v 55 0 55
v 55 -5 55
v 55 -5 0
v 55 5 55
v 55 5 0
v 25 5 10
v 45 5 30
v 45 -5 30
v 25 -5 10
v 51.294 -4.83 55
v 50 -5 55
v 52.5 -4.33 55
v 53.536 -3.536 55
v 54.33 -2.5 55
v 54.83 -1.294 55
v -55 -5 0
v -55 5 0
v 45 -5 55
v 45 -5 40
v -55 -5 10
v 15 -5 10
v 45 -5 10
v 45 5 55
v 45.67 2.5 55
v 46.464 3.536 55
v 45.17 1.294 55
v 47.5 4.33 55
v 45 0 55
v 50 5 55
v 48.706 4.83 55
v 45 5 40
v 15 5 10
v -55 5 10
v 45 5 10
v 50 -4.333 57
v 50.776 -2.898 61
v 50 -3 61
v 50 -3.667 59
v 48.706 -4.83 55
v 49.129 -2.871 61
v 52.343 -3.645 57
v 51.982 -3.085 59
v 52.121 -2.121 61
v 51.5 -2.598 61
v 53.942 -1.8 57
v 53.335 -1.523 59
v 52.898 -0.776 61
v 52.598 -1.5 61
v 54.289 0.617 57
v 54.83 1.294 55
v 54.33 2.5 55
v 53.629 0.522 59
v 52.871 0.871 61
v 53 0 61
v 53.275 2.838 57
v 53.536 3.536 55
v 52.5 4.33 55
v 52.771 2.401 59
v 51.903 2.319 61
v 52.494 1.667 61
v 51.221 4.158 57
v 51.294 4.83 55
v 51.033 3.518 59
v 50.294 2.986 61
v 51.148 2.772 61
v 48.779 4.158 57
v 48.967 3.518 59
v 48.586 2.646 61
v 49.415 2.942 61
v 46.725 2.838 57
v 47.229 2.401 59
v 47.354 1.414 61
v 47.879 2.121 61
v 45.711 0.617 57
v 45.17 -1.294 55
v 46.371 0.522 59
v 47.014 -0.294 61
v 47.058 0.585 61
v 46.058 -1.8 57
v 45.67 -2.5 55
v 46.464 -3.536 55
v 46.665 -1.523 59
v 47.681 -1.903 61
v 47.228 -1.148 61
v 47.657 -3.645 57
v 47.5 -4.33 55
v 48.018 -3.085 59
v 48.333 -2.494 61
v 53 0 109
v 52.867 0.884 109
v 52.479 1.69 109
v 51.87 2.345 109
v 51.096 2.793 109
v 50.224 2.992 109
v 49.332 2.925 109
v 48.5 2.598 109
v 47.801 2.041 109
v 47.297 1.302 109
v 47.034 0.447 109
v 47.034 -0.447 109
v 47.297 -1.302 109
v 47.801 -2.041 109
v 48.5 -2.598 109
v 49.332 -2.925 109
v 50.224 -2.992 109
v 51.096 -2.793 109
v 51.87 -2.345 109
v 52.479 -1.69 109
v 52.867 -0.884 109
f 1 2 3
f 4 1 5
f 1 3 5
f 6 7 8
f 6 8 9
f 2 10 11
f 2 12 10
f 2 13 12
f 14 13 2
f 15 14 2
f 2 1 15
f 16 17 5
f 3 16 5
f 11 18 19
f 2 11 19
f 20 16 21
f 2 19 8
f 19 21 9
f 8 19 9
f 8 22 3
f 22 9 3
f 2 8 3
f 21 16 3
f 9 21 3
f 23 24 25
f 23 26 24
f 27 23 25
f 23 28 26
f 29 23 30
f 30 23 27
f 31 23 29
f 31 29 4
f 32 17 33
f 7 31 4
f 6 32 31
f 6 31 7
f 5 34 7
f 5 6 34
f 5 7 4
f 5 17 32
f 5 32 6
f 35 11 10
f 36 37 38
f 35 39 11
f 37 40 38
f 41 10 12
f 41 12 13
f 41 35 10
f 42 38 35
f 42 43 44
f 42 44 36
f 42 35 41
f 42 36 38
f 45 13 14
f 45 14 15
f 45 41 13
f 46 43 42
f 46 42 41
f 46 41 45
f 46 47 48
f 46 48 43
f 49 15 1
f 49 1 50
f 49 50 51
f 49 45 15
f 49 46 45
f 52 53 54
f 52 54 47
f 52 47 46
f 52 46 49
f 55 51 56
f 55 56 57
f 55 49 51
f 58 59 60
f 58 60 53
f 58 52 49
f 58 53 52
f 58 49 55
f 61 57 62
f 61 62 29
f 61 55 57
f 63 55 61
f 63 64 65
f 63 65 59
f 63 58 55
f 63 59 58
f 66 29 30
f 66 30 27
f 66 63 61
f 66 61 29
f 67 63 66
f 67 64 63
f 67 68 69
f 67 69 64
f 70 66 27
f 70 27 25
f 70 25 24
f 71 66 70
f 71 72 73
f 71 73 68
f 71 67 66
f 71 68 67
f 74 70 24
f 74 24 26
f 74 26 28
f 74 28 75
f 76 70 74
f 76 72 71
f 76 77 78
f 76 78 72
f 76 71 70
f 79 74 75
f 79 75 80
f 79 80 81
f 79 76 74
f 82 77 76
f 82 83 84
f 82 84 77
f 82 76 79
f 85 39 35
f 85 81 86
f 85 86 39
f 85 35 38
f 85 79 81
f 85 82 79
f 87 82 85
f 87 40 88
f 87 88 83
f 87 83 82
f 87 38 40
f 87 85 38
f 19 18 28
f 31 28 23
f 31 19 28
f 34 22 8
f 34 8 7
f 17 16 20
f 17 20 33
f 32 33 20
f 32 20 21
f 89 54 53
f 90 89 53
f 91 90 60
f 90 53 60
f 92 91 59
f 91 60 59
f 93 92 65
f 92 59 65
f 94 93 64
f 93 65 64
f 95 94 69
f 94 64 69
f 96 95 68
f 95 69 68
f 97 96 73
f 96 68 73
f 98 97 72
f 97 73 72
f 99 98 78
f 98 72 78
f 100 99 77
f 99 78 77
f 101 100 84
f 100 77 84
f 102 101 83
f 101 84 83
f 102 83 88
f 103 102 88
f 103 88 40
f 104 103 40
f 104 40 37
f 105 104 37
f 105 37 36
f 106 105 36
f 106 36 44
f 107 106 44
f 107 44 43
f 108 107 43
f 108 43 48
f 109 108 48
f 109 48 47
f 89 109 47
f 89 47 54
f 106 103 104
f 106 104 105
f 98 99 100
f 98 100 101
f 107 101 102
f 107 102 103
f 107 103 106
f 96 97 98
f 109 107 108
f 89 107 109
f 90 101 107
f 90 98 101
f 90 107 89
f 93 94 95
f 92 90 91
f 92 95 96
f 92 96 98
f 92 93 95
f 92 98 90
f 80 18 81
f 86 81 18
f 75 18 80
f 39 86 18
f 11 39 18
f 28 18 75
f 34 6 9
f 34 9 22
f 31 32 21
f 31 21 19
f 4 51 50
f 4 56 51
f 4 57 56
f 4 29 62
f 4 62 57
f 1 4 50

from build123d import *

# Parameters (mm, degrees)
F0_W      = 110
F0_H      = 10
F1_DEPTH  = 10
F2_W      = 10
F2_H      = 10
F3_DEPTH  = 45
F4_R      = 3
F5_DEPTH  = 54
F12_DEPTH = 10


with BuildPart() as f1:
    # F0 (on Top) → F1 (new body)
    with BuildSketch(Plane.XY):
        Rectangle(F0_W, F0_H)
    extrude(amount=F1_DEPTH)

    # F2 (on face) → F3 (join)
    with BuildSketch(Plane.XY.offset(10)):
        with Locations((50, 0)):
            Rectangle(F2_W, F2_H)
    extrude(amount=F3_DEPTH)

    # F4 (on face) → F5 (join)
    with BuildSketch(Plane.XY.offset(55)):
        with Locations((50, 0)):
            Circle(F4_R)
    extrude(amount=F5_DEPTH)

    # F7 (on mid) → F9 (revolve)
    with BuildSketch(Plane(origin=(50, 0, 0), x_dir=(0, -1, 0), z_dir=(-1, 0, 0))):
        Polygon((0, 70), (0, 55), (5, 55), align=None)
    revolve(axis=Axis((50, 0, 50.9786196053), (0, 0, 1)))

    # F11 (on offset) → F12 (join, through all)
    with BuildSketch(Plane(origin=(0, 5, 0), x_dir=(-1, 0, 0), z_dir=(0, 1, 0))):
        Polygon((-25, 10), (-15, 10), (-45, 40), (-45, 30), align=None)
    extrude(amount=-F12_DEPTH)


solid = f1.part
